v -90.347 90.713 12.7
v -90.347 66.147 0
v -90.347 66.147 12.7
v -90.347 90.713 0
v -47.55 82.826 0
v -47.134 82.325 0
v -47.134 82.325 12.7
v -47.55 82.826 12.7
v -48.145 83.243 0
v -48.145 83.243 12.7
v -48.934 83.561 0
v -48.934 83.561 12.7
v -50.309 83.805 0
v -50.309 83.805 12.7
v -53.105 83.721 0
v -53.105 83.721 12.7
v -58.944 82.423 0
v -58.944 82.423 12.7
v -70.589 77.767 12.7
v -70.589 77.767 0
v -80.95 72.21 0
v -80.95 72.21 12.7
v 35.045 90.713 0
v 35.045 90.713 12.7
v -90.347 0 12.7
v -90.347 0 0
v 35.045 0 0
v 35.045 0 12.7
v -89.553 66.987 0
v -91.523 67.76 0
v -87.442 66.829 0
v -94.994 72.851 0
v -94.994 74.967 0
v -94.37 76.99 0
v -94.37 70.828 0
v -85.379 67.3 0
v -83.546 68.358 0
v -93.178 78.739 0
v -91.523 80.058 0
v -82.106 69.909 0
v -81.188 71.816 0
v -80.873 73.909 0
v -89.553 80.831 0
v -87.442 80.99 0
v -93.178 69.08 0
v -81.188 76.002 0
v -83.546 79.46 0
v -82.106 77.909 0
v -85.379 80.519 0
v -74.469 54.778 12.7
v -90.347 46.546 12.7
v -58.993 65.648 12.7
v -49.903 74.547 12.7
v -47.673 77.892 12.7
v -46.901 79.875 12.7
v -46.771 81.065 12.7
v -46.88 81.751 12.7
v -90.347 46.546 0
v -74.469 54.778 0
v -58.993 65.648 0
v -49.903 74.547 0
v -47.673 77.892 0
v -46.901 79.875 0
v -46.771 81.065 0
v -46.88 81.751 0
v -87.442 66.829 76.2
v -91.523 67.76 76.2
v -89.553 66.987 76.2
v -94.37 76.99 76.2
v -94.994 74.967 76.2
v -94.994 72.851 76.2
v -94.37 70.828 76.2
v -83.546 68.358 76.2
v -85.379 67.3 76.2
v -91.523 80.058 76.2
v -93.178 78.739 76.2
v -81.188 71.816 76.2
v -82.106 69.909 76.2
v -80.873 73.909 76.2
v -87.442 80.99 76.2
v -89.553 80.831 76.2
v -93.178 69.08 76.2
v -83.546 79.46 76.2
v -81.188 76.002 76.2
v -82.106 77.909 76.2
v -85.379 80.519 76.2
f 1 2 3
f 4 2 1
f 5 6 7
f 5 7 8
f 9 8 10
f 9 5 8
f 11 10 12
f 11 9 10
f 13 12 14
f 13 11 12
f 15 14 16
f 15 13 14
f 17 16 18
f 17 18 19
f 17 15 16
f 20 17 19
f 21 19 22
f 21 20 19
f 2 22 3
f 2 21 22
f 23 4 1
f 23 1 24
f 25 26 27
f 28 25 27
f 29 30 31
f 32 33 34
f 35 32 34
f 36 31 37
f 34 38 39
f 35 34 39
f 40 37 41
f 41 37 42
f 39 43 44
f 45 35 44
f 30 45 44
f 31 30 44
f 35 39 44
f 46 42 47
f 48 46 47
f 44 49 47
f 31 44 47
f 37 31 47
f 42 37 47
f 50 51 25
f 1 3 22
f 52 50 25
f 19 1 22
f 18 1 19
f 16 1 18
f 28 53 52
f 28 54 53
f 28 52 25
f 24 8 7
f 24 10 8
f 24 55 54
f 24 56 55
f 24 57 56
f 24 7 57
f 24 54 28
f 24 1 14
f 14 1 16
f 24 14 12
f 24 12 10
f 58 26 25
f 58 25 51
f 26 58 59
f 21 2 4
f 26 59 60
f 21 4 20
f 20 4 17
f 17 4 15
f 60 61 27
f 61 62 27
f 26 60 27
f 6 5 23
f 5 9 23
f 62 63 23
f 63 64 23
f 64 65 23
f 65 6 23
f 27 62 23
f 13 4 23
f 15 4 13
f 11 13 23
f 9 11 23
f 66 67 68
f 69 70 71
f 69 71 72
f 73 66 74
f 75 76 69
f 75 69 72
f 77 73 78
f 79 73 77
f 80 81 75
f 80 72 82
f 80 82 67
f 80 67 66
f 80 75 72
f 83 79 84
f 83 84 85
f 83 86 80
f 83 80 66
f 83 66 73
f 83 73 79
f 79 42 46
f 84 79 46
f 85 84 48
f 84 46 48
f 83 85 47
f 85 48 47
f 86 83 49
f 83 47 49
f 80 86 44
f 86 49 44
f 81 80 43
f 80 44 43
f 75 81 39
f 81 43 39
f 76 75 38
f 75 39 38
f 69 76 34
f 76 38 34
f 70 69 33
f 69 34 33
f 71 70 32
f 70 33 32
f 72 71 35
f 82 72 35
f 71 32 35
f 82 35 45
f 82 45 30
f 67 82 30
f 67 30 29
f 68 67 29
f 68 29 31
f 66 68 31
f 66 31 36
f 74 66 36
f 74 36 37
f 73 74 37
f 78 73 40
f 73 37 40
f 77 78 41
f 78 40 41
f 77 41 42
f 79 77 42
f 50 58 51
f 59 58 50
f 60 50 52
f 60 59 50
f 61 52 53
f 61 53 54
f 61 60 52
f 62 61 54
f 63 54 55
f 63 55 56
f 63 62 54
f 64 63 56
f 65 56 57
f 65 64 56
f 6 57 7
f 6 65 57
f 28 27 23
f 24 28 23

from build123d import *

# Parameters (mm, degrees)
F5_W      = 125.391960144
F5_H      = 90.7131507993
F0_DEPTH  = 25.4
F0_FACE_W = 125.391960144
F0_FACE_H = 90.7131507993
F2_DEPTH  = 12.7
F3_R      = 7.1003794984
F4_DEPTH  = 76.2


with BuildPart() as f0:
    # F5 (on Top) → F0 (new body)
    with BuildSketch(Plane.XY):
        with Locations((-27.6510342956, 45.3565753996)):
            Rectangle(F5_W, F5_H)
    extrude(amount=F0_DEPTH)

    # F1 (on Top) + F0_face (on face) → F2 (cut, symmetric)
    with BuildSketch(Plane.XY):
        with BuildLine():
            add(Edge.make_bspline(
                [(-47.1335723996, 82.3248922825), (-55.4265383348, 95.797767977), (-98.0573000245, 60.2685092588), (-140.6880617142, 24.7392505407), (-89.7643340893, 46.7956335644), (-38.8406064644, 68.852016588), (-47.1335723996, 82.3248922825)],
                knots=[0, 0, 0, 2.0943951024, 2.0943951024, 4.1887902048, 4.1887902048, 6.2831853072, 6.2831853072, 6.2831853072], degree=2, weights=[1, 0.5, 1, 0.5, 1, 0.5, 1]))
        make_face()
    with BuildSketch(Plane(origin=(-27.6510342956, 45.3565753996, 25.4), x_dir=(1, 0, 0), z_dir=(0, 0, 1))):
        Rectangle(F0_FACE_W, F0_FACE_H)
    extrude(amount=F2_DEPTH, both=True, mode=Mode.SUBTRACT)


with BuildPart() as f4:
    # F3 (on Top) → F4 (new body)
    with BuildSketch(Plane.XY):
        with Locations((-87.9730582237, 73.9091187716)):
            Circle(F3_R)
    extrude(amount=F4_DEPTH)


solid = Compound([f0.part, f4.part])
